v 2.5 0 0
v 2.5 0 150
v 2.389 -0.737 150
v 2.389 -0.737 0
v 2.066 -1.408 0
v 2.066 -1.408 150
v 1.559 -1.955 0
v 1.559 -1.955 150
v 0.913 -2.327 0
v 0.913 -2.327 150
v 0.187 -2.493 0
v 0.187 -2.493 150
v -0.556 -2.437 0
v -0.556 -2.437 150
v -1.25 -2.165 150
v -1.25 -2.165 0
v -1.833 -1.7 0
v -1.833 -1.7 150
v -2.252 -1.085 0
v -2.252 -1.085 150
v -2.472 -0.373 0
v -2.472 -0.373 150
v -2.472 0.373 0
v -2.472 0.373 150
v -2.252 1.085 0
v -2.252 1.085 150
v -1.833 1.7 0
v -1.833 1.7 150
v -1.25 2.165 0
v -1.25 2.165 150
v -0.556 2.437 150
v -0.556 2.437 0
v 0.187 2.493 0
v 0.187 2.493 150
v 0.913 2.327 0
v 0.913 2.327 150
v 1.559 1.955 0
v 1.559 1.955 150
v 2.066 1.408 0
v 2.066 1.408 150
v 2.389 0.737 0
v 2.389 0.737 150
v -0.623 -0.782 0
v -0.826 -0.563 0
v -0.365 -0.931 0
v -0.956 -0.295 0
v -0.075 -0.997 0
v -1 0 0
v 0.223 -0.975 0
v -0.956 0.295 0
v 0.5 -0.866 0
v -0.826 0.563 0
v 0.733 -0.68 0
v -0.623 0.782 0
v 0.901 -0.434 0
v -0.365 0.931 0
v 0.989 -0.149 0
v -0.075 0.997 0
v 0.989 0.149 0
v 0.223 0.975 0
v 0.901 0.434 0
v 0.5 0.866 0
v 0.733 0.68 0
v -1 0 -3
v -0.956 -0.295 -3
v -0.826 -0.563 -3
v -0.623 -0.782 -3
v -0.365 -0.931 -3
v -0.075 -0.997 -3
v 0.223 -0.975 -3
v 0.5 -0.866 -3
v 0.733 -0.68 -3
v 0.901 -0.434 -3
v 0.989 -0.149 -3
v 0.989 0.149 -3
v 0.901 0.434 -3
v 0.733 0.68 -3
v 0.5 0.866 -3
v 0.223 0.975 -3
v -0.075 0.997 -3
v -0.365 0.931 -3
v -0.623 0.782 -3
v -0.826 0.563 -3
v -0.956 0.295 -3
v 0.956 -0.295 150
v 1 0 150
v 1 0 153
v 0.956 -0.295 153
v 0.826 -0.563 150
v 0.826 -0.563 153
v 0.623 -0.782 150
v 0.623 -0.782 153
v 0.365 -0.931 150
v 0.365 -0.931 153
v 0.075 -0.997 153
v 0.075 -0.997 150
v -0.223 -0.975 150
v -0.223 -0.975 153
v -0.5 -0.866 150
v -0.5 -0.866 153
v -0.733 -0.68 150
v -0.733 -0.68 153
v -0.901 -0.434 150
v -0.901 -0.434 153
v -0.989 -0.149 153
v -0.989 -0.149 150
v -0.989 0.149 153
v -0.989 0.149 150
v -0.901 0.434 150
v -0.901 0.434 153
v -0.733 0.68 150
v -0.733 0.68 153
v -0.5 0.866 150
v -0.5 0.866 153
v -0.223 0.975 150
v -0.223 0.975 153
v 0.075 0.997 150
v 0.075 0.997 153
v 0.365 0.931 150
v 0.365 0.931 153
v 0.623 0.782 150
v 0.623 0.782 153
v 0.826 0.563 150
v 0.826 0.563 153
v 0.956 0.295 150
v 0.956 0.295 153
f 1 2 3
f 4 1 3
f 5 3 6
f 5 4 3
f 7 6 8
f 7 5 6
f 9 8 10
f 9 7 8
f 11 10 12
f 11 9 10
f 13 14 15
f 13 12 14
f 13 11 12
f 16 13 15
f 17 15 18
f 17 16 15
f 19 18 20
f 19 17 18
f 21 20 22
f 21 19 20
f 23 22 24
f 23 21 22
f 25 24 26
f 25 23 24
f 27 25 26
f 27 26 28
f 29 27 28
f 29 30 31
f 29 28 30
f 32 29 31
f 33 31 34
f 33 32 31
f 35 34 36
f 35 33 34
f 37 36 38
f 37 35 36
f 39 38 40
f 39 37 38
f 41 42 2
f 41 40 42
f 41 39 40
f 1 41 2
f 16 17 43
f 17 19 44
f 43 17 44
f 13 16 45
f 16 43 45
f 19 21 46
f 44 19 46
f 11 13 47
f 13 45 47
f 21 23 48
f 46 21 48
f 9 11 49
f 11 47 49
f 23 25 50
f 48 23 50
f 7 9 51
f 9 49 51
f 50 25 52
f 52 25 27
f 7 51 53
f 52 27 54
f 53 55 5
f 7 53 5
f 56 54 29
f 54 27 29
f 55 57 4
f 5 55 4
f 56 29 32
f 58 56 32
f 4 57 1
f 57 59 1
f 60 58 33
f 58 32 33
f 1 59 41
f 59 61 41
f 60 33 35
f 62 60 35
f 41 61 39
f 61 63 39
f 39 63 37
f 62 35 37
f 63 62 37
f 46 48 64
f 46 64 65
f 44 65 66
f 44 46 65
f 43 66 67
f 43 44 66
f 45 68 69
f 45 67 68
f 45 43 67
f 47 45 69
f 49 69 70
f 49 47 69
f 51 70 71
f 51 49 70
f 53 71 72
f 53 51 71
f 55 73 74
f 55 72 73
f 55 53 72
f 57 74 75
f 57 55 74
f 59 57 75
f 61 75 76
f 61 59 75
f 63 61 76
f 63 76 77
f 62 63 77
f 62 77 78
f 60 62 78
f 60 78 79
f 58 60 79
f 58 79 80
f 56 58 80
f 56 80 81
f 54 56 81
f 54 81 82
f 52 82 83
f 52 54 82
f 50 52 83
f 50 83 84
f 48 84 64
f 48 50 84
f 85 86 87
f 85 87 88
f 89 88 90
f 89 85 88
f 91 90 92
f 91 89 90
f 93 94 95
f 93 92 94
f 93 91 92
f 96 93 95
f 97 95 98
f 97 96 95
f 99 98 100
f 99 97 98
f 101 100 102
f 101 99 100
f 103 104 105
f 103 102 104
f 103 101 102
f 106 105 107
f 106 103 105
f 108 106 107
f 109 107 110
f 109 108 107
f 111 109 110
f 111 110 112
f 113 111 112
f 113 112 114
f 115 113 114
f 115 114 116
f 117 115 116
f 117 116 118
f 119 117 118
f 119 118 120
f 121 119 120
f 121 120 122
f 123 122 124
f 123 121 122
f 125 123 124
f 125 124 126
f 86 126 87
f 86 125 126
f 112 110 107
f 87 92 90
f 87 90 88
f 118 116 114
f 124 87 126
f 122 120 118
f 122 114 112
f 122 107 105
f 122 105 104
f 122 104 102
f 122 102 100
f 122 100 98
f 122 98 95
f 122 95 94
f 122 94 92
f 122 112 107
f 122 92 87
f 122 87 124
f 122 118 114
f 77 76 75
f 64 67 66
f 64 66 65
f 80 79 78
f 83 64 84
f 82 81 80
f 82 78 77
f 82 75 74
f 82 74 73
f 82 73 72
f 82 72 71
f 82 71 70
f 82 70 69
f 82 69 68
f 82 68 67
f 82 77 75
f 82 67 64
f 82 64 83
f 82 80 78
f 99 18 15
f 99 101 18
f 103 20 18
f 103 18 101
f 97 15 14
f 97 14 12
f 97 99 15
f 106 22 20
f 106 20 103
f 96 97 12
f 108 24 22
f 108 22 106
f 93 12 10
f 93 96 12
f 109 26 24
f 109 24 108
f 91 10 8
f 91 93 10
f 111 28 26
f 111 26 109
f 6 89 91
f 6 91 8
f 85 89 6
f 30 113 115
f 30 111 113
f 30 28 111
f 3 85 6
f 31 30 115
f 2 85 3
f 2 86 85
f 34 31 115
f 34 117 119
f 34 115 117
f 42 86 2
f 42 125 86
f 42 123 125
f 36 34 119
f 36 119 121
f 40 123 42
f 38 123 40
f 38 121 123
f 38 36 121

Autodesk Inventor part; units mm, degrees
ref_plane "YZ Plane" through (0, 0, 0) normal (1, 0, 0) x (0, 1, 0)
ref_plane "XZ Plane" through (0, 0, 0) normal (0, 1, 0) x (-1, 0, 0)
ref_plane "XY Plane" through (0, 0, 0) normal (0, 0, 1) x (1, 0, 0)
sketch "Sketch1" plane through (0, 0, 0) normal (0, 0, 1) x (1, 0, 0)
  circle A0 centre (0, 0) radius 2.5
  dimension "d0" = 5
extrude "Extrusion1" add sketch "Sketch1" along normal blind 150
sketch "Sketch2" plane through (0, 0, 150) normal (0, 0, 1) x (1, 0, 0)
  circle A0 centre (0, 0) radius 2.5 projected
  circle A1 centre (0, 0) radius 1
  dimension "d3" = 2
extrude "Extrusion2" add sketch "Sketch2" along normal blind 3 contours A1
sketch "Sketch3" plane through (0, 0, 0) normal (0, 0, -1) x (-1, 0, 0)
  circle A0 centre (0, 0) radius 1
  dimension "d6" = 2
extrude "Extrusion3" add sketch "Sketch3" along normal blind 3
properties part number "Bone-15cm"
